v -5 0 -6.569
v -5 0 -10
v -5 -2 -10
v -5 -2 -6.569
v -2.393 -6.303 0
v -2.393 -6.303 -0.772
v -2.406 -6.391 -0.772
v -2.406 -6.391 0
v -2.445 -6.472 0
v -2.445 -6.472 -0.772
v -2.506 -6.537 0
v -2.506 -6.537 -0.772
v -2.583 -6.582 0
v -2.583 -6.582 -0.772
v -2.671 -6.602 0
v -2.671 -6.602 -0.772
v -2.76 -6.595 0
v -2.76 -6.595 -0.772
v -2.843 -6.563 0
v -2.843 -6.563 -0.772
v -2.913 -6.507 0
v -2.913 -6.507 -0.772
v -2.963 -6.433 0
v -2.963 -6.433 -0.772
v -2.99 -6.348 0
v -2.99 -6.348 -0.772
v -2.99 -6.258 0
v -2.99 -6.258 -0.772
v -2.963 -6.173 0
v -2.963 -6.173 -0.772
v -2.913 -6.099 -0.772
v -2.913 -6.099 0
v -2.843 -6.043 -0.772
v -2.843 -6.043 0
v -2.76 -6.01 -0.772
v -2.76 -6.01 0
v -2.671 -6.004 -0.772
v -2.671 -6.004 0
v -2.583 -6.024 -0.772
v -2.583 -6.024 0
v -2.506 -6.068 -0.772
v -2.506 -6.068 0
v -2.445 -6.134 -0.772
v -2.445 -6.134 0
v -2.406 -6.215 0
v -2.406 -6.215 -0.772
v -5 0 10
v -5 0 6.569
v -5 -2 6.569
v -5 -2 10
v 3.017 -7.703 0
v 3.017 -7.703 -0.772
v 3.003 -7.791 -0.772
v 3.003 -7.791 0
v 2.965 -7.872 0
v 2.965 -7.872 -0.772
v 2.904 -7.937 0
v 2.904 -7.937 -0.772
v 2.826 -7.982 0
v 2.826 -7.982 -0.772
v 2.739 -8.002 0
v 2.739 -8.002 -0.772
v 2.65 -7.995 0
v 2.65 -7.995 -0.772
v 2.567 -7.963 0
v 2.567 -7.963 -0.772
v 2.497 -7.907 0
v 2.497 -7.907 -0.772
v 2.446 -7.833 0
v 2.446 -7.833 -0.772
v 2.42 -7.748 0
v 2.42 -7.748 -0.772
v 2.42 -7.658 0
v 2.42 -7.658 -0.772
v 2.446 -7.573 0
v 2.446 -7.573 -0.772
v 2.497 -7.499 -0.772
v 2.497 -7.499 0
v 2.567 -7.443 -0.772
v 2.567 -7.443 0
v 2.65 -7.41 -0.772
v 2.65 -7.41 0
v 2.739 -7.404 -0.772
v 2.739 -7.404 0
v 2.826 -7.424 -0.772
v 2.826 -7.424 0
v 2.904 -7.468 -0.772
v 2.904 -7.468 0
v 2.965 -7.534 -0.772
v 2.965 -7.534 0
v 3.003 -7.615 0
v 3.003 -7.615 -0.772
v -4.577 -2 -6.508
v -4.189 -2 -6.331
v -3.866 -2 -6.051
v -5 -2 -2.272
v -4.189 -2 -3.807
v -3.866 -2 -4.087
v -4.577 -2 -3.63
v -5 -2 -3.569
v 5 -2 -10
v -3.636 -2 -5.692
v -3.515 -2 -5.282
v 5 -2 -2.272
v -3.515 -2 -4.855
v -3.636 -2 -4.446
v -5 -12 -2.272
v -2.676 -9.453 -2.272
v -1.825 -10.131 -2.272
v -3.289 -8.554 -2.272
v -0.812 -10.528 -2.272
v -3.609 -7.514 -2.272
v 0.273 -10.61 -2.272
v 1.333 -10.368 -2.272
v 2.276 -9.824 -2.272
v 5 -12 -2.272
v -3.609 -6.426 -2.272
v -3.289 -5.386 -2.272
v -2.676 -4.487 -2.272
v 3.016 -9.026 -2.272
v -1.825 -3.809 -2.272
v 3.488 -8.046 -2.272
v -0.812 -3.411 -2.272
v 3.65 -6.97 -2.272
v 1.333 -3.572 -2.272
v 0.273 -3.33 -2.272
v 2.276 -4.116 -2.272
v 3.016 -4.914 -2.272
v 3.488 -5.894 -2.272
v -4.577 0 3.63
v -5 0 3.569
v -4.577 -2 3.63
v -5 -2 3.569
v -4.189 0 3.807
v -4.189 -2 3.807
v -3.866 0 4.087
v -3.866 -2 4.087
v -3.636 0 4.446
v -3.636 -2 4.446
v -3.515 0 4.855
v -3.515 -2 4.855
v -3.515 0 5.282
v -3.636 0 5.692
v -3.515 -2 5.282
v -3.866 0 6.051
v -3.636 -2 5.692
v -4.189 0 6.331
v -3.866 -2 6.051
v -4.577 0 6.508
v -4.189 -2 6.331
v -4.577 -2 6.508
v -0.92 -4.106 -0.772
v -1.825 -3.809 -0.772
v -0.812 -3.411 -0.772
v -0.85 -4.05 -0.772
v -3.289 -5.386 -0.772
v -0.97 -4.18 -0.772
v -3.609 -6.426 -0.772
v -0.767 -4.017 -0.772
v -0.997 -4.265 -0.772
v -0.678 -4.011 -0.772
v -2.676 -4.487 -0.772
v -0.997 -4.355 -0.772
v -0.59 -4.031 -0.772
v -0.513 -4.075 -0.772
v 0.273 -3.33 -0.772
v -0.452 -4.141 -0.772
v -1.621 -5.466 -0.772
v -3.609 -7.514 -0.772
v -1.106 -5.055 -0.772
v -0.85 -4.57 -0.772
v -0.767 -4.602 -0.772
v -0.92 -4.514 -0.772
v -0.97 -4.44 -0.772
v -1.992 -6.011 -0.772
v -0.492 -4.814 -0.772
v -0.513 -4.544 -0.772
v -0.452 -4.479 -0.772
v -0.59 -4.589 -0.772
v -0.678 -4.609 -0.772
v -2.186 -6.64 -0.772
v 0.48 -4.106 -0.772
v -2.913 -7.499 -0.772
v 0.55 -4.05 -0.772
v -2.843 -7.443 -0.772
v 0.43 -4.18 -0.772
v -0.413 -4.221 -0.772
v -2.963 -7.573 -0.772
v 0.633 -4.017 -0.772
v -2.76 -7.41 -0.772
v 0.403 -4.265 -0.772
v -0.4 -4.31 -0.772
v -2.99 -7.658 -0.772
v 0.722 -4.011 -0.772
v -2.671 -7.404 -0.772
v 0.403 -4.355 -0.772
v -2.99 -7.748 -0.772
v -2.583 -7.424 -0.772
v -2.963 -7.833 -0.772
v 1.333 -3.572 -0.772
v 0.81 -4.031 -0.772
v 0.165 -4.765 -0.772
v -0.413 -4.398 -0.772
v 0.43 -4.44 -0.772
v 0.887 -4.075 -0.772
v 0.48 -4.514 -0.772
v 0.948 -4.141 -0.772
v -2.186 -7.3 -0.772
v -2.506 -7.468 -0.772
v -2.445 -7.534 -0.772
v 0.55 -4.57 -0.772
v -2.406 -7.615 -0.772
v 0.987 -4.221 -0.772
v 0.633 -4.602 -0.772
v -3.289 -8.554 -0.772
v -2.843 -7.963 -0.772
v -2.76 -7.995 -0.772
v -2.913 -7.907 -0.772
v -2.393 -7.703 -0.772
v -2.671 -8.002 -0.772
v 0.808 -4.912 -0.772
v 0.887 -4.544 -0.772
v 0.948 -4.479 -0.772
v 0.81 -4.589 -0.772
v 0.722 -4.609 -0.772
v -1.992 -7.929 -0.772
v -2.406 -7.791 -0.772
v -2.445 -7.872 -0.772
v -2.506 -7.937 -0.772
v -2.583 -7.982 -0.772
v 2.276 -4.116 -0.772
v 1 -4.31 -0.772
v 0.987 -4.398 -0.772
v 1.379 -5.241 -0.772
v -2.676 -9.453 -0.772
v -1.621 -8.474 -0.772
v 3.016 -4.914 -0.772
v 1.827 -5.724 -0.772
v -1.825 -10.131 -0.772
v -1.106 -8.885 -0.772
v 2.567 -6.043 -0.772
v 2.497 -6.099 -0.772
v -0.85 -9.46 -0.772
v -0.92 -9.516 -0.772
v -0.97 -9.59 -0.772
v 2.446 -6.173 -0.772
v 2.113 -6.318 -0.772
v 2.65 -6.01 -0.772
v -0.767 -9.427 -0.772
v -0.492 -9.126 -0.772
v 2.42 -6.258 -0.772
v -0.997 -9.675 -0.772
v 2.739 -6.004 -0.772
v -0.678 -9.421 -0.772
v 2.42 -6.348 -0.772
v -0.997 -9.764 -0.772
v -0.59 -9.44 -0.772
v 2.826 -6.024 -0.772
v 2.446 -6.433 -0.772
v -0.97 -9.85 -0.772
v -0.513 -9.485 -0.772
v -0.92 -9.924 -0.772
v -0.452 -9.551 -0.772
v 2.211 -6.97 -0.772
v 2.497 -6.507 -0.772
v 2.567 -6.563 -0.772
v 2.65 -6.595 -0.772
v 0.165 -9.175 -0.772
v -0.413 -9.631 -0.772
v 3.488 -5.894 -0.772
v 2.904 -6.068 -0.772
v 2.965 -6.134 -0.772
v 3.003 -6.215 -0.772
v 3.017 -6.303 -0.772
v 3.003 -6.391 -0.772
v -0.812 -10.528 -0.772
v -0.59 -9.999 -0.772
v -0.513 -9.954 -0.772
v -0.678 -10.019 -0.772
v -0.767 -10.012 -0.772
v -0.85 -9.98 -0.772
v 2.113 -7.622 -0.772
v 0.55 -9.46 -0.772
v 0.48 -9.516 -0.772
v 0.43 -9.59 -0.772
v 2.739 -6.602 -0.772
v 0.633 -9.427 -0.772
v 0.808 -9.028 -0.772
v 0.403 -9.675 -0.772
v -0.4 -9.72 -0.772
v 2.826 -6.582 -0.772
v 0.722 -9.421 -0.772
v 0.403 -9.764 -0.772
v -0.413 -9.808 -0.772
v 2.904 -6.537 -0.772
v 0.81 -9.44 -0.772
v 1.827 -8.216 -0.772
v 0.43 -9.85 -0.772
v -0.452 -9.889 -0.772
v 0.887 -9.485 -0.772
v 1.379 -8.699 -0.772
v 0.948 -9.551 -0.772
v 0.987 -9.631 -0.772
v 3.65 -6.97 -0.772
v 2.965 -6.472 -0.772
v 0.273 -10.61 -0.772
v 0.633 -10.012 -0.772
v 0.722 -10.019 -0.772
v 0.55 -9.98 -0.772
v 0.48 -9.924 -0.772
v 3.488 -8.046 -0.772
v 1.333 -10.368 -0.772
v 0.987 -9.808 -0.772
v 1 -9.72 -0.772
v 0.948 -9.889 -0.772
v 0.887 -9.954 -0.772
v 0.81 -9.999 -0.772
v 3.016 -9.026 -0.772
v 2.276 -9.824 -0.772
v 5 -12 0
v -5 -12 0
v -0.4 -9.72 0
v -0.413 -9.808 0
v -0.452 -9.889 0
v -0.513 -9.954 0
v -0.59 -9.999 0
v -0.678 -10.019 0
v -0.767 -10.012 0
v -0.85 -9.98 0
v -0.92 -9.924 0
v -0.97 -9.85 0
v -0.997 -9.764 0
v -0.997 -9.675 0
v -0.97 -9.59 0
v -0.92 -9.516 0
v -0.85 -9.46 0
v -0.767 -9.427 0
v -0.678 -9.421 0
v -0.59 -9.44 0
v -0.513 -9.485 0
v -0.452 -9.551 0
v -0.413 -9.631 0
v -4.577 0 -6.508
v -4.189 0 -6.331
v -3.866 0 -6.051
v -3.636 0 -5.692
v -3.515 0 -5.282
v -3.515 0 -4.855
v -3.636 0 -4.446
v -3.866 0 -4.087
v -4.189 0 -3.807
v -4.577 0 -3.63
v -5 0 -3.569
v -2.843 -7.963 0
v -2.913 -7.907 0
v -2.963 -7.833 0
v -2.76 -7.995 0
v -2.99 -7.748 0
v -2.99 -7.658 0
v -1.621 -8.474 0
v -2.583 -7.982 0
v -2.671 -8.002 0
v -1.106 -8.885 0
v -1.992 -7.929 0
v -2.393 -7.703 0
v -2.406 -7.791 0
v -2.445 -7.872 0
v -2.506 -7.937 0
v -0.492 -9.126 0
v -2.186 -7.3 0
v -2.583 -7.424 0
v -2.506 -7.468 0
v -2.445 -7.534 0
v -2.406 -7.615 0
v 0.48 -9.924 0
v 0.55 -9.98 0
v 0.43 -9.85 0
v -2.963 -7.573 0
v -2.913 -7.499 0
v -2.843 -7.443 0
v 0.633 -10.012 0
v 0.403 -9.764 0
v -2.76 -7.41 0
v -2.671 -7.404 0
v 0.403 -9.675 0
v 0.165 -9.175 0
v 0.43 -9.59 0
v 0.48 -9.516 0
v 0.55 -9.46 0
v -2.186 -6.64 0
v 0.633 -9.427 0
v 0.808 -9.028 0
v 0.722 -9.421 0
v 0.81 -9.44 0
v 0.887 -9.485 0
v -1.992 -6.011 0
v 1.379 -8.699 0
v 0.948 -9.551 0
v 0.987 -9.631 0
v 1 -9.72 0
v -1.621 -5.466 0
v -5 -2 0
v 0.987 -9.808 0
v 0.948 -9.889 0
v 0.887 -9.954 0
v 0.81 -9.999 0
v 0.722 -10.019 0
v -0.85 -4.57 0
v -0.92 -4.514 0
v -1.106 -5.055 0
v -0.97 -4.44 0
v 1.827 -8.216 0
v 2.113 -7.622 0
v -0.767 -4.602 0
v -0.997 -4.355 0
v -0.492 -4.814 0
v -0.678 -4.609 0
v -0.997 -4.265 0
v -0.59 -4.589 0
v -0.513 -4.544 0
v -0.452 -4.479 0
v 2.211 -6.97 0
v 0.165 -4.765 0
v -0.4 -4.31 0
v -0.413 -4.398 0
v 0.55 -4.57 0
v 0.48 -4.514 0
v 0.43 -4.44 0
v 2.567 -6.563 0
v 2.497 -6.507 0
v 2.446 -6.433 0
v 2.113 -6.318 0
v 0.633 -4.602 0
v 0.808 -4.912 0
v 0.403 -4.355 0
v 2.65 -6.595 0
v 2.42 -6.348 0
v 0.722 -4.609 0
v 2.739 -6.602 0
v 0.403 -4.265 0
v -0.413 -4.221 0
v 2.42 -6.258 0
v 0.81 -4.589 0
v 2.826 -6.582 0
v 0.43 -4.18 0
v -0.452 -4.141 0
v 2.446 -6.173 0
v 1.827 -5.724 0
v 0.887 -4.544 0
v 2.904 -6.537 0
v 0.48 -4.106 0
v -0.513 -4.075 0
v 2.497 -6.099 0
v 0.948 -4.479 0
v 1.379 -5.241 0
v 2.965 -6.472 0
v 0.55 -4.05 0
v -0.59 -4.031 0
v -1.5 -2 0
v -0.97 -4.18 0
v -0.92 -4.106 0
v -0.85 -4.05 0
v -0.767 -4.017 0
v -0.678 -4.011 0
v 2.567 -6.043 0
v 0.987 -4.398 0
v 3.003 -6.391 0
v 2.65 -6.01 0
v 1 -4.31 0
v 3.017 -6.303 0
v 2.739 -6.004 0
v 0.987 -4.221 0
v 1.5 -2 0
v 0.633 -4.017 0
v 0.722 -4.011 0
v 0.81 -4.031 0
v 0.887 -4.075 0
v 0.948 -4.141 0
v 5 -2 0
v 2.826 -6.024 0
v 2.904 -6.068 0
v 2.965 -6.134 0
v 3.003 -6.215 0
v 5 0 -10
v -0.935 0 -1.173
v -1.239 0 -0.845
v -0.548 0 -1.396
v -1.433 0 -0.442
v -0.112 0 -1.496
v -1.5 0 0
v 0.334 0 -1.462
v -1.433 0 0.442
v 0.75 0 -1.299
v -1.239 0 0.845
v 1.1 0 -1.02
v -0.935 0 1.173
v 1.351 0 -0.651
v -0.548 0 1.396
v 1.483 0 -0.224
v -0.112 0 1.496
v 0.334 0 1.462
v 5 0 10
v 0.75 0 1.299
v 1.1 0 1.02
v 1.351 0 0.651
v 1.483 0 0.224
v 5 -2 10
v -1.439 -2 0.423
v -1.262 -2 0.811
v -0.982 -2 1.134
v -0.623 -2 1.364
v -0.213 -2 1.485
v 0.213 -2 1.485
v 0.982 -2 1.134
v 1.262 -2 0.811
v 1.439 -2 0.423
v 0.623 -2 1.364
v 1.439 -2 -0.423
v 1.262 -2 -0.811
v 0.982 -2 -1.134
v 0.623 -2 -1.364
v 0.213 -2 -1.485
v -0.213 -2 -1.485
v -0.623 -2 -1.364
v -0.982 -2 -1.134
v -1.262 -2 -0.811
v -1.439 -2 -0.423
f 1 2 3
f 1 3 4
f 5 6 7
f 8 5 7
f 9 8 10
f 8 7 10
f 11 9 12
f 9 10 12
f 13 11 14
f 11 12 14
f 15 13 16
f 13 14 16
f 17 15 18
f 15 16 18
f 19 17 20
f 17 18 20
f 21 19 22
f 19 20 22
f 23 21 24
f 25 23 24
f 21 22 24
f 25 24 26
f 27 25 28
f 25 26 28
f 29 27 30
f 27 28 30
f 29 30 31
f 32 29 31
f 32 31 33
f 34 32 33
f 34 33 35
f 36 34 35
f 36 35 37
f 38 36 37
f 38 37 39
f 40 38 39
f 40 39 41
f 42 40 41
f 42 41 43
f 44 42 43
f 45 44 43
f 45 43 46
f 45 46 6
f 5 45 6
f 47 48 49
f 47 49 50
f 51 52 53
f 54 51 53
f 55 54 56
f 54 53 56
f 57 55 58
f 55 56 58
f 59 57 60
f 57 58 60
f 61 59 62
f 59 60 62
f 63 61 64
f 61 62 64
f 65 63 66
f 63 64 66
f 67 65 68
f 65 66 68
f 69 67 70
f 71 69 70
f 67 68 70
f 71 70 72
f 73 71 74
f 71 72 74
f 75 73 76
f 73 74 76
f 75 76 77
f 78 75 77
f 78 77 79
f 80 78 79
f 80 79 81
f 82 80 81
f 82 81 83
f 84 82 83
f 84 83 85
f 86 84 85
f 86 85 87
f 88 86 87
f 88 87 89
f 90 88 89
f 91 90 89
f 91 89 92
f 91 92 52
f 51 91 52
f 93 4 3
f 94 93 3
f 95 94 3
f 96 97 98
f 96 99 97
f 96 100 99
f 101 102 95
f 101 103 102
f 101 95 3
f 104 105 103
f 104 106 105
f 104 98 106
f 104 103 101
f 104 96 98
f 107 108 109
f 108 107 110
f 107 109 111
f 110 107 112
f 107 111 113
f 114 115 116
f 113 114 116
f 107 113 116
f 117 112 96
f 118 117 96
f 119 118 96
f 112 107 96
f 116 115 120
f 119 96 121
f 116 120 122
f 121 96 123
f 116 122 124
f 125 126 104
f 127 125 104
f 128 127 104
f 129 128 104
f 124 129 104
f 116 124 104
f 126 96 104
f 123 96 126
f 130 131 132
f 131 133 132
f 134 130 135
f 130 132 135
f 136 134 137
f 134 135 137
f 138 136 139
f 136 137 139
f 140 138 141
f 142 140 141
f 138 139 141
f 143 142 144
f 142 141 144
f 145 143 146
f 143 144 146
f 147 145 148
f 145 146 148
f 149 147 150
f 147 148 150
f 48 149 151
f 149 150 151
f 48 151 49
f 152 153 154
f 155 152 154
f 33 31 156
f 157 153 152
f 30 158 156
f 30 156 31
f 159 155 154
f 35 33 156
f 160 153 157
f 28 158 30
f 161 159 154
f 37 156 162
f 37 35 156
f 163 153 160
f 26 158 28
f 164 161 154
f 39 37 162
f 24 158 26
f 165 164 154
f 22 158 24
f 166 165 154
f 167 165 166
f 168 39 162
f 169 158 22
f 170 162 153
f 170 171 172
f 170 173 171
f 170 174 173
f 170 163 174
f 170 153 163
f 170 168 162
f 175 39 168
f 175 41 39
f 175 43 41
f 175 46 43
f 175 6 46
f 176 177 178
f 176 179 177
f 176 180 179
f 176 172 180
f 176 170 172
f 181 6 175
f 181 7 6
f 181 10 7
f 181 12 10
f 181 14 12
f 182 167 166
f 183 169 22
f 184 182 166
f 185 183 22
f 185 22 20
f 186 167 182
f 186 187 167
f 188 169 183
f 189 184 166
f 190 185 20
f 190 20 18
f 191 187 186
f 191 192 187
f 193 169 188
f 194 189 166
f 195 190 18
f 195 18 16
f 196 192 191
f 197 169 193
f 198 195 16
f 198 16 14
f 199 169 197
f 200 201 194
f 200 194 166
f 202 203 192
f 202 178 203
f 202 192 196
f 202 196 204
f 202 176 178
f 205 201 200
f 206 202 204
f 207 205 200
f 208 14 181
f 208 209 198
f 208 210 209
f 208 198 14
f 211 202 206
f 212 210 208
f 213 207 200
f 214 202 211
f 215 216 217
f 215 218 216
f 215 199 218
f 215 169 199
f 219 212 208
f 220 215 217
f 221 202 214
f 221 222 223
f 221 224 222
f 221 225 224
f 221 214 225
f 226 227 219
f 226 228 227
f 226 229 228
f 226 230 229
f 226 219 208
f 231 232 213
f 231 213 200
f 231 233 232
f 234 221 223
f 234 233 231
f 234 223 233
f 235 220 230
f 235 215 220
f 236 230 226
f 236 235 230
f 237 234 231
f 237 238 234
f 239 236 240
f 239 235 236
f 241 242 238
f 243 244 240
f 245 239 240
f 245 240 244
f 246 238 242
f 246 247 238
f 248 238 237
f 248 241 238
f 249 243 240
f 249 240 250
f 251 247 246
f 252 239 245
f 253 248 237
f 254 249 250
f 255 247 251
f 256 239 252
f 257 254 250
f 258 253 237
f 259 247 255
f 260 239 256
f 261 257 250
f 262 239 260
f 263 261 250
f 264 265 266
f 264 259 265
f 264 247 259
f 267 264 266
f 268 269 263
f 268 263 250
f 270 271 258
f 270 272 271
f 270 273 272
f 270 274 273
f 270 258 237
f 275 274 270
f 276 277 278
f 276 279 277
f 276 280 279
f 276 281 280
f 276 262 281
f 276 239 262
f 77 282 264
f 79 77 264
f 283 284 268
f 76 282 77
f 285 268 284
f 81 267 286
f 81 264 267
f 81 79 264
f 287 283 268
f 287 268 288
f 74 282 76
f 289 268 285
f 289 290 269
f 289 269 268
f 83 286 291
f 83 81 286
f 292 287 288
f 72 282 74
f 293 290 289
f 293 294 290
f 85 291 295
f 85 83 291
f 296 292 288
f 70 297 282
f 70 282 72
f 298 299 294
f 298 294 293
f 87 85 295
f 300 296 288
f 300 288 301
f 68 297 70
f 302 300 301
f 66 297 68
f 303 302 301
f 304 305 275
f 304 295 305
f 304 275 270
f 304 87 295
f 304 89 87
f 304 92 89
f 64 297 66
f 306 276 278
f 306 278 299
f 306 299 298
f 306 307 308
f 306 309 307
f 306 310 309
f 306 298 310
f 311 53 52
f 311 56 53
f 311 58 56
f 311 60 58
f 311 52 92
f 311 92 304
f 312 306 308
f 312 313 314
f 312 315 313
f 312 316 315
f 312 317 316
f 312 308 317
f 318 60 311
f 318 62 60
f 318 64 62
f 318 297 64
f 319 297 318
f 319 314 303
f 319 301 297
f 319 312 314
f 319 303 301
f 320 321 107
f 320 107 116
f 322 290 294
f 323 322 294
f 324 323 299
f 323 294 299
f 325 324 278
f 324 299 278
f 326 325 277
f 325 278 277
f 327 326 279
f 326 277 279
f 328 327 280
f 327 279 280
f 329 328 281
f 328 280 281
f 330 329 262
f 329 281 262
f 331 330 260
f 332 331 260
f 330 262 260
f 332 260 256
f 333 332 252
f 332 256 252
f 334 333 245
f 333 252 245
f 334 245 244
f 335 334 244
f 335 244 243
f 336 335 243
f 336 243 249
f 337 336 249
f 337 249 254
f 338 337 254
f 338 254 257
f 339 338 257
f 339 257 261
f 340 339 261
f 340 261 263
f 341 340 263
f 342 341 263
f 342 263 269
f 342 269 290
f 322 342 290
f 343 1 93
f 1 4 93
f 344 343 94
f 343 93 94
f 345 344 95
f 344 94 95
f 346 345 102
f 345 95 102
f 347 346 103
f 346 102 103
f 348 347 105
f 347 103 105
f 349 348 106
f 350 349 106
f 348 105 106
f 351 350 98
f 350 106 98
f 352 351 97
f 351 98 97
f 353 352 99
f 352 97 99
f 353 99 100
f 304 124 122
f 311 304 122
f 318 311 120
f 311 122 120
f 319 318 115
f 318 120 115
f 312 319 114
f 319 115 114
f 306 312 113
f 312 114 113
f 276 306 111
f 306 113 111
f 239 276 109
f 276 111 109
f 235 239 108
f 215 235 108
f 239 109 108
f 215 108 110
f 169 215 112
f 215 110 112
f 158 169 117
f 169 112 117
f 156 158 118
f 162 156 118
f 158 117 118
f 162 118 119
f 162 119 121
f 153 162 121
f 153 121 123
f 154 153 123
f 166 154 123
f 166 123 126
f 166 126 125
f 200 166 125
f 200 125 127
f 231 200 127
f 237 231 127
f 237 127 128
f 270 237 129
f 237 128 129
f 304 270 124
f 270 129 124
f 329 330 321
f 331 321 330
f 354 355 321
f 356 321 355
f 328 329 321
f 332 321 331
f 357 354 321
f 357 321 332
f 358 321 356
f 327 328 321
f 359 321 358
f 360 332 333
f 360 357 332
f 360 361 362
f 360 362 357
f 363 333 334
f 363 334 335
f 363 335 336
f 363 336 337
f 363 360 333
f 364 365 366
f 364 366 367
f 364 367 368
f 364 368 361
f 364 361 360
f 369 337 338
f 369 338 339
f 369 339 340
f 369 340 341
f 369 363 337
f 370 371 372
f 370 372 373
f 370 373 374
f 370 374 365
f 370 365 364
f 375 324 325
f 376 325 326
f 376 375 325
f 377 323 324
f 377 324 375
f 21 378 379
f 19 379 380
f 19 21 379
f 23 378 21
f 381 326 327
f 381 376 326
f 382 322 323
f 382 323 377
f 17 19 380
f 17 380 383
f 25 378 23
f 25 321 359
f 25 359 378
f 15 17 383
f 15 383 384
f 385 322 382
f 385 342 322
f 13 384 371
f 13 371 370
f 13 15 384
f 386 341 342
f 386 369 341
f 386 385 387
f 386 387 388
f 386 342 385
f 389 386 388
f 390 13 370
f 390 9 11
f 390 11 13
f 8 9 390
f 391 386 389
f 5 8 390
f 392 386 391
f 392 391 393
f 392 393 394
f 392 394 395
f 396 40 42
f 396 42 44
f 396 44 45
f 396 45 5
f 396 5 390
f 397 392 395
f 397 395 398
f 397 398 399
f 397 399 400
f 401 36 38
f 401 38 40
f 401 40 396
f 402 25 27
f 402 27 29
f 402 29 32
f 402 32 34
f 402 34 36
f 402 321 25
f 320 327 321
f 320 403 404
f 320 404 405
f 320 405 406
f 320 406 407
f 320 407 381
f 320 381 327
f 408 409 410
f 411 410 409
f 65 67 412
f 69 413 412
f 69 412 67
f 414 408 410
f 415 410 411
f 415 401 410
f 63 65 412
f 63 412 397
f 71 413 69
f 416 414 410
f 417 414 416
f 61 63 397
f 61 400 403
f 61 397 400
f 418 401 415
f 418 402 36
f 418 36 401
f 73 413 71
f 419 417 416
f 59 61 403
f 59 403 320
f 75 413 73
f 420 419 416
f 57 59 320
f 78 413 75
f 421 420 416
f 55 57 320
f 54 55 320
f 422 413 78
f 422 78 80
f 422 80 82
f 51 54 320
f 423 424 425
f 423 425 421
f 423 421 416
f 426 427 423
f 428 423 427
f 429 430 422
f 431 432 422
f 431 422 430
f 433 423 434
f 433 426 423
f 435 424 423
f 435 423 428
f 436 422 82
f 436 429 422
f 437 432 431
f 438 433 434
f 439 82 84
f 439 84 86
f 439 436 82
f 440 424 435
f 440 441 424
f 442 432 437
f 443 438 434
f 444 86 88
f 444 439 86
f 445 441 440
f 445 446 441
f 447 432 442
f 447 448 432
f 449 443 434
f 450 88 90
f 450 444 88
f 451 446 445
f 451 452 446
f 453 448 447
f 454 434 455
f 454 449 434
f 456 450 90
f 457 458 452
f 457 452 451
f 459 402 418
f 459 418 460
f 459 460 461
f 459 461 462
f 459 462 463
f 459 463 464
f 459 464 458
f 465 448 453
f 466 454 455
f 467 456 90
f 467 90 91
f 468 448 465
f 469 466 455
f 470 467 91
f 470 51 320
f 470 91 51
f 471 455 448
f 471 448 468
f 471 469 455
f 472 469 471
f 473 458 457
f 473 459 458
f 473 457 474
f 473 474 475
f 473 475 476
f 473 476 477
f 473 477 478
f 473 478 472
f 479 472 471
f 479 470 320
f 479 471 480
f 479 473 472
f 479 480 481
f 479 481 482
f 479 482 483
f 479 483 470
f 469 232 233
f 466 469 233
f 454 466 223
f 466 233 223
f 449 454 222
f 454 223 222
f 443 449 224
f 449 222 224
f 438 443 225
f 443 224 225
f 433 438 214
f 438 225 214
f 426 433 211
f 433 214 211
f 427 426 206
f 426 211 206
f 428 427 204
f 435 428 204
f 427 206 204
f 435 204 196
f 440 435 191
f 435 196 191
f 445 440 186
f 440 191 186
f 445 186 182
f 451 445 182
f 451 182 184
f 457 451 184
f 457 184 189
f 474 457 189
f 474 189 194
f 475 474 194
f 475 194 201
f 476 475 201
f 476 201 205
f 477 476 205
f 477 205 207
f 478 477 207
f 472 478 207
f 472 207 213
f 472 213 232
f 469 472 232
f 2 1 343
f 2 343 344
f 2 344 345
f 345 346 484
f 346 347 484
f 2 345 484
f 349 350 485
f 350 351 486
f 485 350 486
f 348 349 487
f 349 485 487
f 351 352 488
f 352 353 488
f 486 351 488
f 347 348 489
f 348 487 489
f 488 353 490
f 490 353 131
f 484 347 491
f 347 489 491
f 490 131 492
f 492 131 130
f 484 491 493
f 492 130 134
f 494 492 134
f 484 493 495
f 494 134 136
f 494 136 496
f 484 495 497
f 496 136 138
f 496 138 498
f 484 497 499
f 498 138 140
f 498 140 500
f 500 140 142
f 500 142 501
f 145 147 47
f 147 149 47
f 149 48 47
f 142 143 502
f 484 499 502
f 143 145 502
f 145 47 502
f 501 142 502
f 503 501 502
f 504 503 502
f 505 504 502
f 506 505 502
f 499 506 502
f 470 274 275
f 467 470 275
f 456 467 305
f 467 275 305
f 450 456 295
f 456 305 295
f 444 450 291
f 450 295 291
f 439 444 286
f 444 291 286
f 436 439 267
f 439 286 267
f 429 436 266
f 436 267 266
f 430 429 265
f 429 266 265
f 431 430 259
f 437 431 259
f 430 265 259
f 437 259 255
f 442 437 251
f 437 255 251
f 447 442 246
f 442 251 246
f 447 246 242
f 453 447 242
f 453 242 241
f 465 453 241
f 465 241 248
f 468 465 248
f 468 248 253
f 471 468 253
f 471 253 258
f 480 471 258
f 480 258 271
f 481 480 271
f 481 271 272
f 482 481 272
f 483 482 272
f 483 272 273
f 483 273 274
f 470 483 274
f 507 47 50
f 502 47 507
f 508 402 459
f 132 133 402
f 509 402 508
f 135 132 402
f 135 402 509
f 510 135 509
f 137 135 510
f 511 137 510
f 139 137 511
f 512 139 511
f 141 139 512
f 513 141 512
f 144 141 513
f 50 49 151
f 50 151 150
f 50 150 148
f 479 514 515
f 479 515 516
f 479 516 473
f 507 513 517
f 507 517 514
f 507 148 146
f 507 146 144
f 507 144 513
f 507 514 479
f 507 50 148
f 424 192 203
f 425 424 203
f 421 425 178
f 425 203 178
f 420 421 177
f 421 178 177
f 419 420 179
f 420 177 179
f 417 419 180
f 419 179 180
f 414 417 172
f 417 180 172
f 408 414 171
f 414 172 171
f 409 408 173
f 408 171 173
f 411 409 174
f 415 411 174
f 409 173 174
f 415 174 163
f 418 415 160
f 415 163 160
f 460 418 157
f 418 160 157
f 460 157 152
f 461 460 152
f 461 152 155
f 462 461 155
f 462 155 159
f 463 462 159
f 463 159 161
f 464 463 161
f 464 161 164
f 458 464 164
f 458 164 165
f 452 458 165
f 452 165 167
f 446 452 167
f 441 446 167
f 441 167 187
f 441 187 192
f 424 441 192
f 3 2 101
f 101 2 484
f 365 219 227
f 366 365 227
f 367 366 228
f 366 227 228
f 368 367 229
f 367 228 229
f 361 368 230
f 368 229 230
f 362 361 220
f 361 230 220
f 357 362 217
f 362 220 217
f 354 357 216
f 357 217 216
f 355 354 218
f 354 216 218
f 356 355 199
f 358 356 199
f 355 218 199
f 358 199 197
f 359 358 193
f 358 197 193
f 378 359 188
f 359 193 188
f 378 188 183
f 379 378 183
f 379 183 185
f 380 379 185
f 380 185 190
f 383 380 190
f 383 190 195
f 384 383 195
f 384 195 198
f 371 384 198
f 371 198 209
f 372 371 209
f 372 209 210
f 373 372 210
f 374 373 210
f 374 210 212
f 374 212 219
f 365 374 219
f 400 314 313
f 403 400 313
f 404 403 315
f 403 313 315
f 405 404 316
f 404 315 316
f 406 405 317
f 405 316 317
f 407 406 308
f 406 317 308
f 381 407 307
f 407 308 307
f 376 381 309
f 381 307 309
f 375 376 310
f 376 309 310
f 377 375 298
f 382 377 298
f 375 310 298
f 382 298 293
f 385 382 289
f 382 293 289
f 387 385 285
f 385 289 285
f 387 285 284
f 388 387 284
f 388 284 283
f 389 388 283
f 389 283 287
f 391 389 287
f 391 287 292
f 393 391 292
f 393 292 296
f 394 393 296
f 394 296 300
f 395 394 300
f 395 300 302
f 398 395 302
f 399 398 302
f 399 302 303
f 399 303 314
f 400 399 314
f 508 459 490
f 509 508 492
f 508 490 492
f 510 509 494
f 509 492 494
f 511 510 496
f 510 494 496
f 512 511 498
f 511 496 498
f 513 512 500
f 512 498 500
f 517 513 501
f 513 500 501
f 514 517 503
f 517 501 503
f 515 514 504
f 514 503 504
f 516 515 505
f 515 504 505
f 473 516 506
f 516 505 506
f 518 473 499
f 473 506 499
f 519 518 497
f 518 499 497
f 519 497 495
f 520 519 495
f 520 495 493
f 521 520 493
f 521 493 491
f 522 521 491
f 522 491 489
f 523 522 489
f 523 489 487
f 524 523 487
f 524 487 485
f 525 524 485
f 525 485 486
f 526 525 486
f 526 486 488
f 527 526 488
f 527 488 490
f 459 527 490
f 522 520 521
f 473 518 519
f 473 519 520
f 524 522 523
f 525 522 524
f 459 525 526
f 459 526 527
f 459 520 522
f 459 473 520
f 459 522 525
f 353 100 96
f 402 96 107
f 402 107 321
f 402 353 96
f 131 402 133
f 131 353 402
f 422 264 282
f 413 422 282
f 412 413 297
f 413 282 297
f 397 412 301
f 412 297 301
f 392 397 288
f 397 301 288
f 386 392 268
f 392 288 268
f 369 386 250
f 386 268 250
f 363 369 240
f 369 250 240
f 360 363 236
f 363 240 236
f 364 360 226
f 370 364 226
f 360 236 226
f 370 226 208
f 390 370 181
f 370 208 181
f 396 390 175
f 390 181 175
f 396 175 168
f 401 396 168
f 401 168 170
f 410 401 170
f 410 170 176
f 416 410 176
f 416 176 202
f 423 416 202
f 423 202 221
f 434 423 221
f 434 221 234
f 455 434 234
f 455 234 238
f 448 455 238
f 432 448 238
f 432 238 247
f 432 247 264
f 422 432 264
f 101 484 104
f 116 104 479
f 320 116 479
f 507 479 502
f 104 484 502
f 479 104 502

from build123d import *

# Parameters (mm, degrees)
F0_W      = 10
F0_H      = 20
F1_DEPTH  = 2
F2_R      = 1.5
F3_DEPTH  = 25.4
F4_W      = 10
F4_H      = 2.271716
F5_DEPTH  = 10
F6_R      = 1.5
F7_DEPTH  = 2
F8_R      = 3.65
F9_DEPTH  = 1.5
F10_R     = 2.211105
F11_DEPTH = 1
F12_R     = 0.3
F13_DEPTH = 1


with BuildPart() as f1:
    # F0 (on Front) → F1 (new body)
    with BuildSketch(Plane.XZ):
        Rectangle(F0_W, F0_H)
    extrude(amount=F1_DEPTH)

    # F2 (on face) → F3 (cut)
    with BuildSketch(Plane.XZ.offset(2)):
        with Locations((-5, 5.06894)):
            Circle(F2_R)
        with Locations((-5, -5.06894)):
            Circle(F2_R)
    extrude(amount=-F3_DEPTH, mode=Mode.SUBTRACT)

    # F4 (on face) → F5 (join)
    with BuildSketch(Plane.XZ.offset(2)):
        with Locations((0, -1.135858)):
            Rectangle(F4_W, F4_H)
    extrude(amount=F5_DEPTH)

    # F6 (on face) → F7 (cut)
    with BuildSketch(Plane(origin=(0, 0, 0), x_dir=(-1, 0, 0), z_dir=(0, 1, 0))):
        Circle(F6_R)
    extrude(amount=-F7_DEPTH, mode=Mode.SUBTRACT)

    # F8 (on face) → F9 (cut)
    with BuildSketch(Plane(origin=(0, 0, -2.271716), x_dir=(1, 0, 0), z_dir=(0, 0, -1))):
        with Locations((0, 6.969983)):
            Circle(F8_R)
    extrude(amount=-F9_DEPTH, mode=Mode.SUBTRACT)

    # F10 (on face) → F11 (cut)
    with BuildSketch(Plane(origin=(0, 0, -0.771716), x_dir=(1, 0, 0), z_dir=(0, 0, -1))):
        with Locations((0, 6.969983)):
            Circle(F10_R)
    extrude(amount=-F11_DEPTH, mode=Mode.SUBTRACT)

    # F12 (on face) → F13 (cut)
    with BuildSketch(Plane(origin=(0, 0, -0.771716), x_dir=(1, 0, 0), z_dir=(0, 0, -1))):
        with Locations((0.7, 4.309839)):
            Circle(F12_R)
        with Locations((-0.7, 4.309839)):
            Circle(F12_R)
        with Locations((0.7, 9.71972)):
            Circle(F12_R)
        with Locations((-0.7, 9.71972)):
            Circle(F12_R)
        with Locations((-2.693097, 6.302936)):
            Circle(F12_R)
        with Locations((-2.693097, 7.702936)):
            Circle(F12_R)
        with Locations((2.716784, 6.302936)):
            Circle(F12_R)
        with Locations((2.716784, 7.702936)):
            Circle(F12_R)
    extrude(amount=-F13_DEPTH, mode=Mode.SUBTRACT)


solid = f1.part
